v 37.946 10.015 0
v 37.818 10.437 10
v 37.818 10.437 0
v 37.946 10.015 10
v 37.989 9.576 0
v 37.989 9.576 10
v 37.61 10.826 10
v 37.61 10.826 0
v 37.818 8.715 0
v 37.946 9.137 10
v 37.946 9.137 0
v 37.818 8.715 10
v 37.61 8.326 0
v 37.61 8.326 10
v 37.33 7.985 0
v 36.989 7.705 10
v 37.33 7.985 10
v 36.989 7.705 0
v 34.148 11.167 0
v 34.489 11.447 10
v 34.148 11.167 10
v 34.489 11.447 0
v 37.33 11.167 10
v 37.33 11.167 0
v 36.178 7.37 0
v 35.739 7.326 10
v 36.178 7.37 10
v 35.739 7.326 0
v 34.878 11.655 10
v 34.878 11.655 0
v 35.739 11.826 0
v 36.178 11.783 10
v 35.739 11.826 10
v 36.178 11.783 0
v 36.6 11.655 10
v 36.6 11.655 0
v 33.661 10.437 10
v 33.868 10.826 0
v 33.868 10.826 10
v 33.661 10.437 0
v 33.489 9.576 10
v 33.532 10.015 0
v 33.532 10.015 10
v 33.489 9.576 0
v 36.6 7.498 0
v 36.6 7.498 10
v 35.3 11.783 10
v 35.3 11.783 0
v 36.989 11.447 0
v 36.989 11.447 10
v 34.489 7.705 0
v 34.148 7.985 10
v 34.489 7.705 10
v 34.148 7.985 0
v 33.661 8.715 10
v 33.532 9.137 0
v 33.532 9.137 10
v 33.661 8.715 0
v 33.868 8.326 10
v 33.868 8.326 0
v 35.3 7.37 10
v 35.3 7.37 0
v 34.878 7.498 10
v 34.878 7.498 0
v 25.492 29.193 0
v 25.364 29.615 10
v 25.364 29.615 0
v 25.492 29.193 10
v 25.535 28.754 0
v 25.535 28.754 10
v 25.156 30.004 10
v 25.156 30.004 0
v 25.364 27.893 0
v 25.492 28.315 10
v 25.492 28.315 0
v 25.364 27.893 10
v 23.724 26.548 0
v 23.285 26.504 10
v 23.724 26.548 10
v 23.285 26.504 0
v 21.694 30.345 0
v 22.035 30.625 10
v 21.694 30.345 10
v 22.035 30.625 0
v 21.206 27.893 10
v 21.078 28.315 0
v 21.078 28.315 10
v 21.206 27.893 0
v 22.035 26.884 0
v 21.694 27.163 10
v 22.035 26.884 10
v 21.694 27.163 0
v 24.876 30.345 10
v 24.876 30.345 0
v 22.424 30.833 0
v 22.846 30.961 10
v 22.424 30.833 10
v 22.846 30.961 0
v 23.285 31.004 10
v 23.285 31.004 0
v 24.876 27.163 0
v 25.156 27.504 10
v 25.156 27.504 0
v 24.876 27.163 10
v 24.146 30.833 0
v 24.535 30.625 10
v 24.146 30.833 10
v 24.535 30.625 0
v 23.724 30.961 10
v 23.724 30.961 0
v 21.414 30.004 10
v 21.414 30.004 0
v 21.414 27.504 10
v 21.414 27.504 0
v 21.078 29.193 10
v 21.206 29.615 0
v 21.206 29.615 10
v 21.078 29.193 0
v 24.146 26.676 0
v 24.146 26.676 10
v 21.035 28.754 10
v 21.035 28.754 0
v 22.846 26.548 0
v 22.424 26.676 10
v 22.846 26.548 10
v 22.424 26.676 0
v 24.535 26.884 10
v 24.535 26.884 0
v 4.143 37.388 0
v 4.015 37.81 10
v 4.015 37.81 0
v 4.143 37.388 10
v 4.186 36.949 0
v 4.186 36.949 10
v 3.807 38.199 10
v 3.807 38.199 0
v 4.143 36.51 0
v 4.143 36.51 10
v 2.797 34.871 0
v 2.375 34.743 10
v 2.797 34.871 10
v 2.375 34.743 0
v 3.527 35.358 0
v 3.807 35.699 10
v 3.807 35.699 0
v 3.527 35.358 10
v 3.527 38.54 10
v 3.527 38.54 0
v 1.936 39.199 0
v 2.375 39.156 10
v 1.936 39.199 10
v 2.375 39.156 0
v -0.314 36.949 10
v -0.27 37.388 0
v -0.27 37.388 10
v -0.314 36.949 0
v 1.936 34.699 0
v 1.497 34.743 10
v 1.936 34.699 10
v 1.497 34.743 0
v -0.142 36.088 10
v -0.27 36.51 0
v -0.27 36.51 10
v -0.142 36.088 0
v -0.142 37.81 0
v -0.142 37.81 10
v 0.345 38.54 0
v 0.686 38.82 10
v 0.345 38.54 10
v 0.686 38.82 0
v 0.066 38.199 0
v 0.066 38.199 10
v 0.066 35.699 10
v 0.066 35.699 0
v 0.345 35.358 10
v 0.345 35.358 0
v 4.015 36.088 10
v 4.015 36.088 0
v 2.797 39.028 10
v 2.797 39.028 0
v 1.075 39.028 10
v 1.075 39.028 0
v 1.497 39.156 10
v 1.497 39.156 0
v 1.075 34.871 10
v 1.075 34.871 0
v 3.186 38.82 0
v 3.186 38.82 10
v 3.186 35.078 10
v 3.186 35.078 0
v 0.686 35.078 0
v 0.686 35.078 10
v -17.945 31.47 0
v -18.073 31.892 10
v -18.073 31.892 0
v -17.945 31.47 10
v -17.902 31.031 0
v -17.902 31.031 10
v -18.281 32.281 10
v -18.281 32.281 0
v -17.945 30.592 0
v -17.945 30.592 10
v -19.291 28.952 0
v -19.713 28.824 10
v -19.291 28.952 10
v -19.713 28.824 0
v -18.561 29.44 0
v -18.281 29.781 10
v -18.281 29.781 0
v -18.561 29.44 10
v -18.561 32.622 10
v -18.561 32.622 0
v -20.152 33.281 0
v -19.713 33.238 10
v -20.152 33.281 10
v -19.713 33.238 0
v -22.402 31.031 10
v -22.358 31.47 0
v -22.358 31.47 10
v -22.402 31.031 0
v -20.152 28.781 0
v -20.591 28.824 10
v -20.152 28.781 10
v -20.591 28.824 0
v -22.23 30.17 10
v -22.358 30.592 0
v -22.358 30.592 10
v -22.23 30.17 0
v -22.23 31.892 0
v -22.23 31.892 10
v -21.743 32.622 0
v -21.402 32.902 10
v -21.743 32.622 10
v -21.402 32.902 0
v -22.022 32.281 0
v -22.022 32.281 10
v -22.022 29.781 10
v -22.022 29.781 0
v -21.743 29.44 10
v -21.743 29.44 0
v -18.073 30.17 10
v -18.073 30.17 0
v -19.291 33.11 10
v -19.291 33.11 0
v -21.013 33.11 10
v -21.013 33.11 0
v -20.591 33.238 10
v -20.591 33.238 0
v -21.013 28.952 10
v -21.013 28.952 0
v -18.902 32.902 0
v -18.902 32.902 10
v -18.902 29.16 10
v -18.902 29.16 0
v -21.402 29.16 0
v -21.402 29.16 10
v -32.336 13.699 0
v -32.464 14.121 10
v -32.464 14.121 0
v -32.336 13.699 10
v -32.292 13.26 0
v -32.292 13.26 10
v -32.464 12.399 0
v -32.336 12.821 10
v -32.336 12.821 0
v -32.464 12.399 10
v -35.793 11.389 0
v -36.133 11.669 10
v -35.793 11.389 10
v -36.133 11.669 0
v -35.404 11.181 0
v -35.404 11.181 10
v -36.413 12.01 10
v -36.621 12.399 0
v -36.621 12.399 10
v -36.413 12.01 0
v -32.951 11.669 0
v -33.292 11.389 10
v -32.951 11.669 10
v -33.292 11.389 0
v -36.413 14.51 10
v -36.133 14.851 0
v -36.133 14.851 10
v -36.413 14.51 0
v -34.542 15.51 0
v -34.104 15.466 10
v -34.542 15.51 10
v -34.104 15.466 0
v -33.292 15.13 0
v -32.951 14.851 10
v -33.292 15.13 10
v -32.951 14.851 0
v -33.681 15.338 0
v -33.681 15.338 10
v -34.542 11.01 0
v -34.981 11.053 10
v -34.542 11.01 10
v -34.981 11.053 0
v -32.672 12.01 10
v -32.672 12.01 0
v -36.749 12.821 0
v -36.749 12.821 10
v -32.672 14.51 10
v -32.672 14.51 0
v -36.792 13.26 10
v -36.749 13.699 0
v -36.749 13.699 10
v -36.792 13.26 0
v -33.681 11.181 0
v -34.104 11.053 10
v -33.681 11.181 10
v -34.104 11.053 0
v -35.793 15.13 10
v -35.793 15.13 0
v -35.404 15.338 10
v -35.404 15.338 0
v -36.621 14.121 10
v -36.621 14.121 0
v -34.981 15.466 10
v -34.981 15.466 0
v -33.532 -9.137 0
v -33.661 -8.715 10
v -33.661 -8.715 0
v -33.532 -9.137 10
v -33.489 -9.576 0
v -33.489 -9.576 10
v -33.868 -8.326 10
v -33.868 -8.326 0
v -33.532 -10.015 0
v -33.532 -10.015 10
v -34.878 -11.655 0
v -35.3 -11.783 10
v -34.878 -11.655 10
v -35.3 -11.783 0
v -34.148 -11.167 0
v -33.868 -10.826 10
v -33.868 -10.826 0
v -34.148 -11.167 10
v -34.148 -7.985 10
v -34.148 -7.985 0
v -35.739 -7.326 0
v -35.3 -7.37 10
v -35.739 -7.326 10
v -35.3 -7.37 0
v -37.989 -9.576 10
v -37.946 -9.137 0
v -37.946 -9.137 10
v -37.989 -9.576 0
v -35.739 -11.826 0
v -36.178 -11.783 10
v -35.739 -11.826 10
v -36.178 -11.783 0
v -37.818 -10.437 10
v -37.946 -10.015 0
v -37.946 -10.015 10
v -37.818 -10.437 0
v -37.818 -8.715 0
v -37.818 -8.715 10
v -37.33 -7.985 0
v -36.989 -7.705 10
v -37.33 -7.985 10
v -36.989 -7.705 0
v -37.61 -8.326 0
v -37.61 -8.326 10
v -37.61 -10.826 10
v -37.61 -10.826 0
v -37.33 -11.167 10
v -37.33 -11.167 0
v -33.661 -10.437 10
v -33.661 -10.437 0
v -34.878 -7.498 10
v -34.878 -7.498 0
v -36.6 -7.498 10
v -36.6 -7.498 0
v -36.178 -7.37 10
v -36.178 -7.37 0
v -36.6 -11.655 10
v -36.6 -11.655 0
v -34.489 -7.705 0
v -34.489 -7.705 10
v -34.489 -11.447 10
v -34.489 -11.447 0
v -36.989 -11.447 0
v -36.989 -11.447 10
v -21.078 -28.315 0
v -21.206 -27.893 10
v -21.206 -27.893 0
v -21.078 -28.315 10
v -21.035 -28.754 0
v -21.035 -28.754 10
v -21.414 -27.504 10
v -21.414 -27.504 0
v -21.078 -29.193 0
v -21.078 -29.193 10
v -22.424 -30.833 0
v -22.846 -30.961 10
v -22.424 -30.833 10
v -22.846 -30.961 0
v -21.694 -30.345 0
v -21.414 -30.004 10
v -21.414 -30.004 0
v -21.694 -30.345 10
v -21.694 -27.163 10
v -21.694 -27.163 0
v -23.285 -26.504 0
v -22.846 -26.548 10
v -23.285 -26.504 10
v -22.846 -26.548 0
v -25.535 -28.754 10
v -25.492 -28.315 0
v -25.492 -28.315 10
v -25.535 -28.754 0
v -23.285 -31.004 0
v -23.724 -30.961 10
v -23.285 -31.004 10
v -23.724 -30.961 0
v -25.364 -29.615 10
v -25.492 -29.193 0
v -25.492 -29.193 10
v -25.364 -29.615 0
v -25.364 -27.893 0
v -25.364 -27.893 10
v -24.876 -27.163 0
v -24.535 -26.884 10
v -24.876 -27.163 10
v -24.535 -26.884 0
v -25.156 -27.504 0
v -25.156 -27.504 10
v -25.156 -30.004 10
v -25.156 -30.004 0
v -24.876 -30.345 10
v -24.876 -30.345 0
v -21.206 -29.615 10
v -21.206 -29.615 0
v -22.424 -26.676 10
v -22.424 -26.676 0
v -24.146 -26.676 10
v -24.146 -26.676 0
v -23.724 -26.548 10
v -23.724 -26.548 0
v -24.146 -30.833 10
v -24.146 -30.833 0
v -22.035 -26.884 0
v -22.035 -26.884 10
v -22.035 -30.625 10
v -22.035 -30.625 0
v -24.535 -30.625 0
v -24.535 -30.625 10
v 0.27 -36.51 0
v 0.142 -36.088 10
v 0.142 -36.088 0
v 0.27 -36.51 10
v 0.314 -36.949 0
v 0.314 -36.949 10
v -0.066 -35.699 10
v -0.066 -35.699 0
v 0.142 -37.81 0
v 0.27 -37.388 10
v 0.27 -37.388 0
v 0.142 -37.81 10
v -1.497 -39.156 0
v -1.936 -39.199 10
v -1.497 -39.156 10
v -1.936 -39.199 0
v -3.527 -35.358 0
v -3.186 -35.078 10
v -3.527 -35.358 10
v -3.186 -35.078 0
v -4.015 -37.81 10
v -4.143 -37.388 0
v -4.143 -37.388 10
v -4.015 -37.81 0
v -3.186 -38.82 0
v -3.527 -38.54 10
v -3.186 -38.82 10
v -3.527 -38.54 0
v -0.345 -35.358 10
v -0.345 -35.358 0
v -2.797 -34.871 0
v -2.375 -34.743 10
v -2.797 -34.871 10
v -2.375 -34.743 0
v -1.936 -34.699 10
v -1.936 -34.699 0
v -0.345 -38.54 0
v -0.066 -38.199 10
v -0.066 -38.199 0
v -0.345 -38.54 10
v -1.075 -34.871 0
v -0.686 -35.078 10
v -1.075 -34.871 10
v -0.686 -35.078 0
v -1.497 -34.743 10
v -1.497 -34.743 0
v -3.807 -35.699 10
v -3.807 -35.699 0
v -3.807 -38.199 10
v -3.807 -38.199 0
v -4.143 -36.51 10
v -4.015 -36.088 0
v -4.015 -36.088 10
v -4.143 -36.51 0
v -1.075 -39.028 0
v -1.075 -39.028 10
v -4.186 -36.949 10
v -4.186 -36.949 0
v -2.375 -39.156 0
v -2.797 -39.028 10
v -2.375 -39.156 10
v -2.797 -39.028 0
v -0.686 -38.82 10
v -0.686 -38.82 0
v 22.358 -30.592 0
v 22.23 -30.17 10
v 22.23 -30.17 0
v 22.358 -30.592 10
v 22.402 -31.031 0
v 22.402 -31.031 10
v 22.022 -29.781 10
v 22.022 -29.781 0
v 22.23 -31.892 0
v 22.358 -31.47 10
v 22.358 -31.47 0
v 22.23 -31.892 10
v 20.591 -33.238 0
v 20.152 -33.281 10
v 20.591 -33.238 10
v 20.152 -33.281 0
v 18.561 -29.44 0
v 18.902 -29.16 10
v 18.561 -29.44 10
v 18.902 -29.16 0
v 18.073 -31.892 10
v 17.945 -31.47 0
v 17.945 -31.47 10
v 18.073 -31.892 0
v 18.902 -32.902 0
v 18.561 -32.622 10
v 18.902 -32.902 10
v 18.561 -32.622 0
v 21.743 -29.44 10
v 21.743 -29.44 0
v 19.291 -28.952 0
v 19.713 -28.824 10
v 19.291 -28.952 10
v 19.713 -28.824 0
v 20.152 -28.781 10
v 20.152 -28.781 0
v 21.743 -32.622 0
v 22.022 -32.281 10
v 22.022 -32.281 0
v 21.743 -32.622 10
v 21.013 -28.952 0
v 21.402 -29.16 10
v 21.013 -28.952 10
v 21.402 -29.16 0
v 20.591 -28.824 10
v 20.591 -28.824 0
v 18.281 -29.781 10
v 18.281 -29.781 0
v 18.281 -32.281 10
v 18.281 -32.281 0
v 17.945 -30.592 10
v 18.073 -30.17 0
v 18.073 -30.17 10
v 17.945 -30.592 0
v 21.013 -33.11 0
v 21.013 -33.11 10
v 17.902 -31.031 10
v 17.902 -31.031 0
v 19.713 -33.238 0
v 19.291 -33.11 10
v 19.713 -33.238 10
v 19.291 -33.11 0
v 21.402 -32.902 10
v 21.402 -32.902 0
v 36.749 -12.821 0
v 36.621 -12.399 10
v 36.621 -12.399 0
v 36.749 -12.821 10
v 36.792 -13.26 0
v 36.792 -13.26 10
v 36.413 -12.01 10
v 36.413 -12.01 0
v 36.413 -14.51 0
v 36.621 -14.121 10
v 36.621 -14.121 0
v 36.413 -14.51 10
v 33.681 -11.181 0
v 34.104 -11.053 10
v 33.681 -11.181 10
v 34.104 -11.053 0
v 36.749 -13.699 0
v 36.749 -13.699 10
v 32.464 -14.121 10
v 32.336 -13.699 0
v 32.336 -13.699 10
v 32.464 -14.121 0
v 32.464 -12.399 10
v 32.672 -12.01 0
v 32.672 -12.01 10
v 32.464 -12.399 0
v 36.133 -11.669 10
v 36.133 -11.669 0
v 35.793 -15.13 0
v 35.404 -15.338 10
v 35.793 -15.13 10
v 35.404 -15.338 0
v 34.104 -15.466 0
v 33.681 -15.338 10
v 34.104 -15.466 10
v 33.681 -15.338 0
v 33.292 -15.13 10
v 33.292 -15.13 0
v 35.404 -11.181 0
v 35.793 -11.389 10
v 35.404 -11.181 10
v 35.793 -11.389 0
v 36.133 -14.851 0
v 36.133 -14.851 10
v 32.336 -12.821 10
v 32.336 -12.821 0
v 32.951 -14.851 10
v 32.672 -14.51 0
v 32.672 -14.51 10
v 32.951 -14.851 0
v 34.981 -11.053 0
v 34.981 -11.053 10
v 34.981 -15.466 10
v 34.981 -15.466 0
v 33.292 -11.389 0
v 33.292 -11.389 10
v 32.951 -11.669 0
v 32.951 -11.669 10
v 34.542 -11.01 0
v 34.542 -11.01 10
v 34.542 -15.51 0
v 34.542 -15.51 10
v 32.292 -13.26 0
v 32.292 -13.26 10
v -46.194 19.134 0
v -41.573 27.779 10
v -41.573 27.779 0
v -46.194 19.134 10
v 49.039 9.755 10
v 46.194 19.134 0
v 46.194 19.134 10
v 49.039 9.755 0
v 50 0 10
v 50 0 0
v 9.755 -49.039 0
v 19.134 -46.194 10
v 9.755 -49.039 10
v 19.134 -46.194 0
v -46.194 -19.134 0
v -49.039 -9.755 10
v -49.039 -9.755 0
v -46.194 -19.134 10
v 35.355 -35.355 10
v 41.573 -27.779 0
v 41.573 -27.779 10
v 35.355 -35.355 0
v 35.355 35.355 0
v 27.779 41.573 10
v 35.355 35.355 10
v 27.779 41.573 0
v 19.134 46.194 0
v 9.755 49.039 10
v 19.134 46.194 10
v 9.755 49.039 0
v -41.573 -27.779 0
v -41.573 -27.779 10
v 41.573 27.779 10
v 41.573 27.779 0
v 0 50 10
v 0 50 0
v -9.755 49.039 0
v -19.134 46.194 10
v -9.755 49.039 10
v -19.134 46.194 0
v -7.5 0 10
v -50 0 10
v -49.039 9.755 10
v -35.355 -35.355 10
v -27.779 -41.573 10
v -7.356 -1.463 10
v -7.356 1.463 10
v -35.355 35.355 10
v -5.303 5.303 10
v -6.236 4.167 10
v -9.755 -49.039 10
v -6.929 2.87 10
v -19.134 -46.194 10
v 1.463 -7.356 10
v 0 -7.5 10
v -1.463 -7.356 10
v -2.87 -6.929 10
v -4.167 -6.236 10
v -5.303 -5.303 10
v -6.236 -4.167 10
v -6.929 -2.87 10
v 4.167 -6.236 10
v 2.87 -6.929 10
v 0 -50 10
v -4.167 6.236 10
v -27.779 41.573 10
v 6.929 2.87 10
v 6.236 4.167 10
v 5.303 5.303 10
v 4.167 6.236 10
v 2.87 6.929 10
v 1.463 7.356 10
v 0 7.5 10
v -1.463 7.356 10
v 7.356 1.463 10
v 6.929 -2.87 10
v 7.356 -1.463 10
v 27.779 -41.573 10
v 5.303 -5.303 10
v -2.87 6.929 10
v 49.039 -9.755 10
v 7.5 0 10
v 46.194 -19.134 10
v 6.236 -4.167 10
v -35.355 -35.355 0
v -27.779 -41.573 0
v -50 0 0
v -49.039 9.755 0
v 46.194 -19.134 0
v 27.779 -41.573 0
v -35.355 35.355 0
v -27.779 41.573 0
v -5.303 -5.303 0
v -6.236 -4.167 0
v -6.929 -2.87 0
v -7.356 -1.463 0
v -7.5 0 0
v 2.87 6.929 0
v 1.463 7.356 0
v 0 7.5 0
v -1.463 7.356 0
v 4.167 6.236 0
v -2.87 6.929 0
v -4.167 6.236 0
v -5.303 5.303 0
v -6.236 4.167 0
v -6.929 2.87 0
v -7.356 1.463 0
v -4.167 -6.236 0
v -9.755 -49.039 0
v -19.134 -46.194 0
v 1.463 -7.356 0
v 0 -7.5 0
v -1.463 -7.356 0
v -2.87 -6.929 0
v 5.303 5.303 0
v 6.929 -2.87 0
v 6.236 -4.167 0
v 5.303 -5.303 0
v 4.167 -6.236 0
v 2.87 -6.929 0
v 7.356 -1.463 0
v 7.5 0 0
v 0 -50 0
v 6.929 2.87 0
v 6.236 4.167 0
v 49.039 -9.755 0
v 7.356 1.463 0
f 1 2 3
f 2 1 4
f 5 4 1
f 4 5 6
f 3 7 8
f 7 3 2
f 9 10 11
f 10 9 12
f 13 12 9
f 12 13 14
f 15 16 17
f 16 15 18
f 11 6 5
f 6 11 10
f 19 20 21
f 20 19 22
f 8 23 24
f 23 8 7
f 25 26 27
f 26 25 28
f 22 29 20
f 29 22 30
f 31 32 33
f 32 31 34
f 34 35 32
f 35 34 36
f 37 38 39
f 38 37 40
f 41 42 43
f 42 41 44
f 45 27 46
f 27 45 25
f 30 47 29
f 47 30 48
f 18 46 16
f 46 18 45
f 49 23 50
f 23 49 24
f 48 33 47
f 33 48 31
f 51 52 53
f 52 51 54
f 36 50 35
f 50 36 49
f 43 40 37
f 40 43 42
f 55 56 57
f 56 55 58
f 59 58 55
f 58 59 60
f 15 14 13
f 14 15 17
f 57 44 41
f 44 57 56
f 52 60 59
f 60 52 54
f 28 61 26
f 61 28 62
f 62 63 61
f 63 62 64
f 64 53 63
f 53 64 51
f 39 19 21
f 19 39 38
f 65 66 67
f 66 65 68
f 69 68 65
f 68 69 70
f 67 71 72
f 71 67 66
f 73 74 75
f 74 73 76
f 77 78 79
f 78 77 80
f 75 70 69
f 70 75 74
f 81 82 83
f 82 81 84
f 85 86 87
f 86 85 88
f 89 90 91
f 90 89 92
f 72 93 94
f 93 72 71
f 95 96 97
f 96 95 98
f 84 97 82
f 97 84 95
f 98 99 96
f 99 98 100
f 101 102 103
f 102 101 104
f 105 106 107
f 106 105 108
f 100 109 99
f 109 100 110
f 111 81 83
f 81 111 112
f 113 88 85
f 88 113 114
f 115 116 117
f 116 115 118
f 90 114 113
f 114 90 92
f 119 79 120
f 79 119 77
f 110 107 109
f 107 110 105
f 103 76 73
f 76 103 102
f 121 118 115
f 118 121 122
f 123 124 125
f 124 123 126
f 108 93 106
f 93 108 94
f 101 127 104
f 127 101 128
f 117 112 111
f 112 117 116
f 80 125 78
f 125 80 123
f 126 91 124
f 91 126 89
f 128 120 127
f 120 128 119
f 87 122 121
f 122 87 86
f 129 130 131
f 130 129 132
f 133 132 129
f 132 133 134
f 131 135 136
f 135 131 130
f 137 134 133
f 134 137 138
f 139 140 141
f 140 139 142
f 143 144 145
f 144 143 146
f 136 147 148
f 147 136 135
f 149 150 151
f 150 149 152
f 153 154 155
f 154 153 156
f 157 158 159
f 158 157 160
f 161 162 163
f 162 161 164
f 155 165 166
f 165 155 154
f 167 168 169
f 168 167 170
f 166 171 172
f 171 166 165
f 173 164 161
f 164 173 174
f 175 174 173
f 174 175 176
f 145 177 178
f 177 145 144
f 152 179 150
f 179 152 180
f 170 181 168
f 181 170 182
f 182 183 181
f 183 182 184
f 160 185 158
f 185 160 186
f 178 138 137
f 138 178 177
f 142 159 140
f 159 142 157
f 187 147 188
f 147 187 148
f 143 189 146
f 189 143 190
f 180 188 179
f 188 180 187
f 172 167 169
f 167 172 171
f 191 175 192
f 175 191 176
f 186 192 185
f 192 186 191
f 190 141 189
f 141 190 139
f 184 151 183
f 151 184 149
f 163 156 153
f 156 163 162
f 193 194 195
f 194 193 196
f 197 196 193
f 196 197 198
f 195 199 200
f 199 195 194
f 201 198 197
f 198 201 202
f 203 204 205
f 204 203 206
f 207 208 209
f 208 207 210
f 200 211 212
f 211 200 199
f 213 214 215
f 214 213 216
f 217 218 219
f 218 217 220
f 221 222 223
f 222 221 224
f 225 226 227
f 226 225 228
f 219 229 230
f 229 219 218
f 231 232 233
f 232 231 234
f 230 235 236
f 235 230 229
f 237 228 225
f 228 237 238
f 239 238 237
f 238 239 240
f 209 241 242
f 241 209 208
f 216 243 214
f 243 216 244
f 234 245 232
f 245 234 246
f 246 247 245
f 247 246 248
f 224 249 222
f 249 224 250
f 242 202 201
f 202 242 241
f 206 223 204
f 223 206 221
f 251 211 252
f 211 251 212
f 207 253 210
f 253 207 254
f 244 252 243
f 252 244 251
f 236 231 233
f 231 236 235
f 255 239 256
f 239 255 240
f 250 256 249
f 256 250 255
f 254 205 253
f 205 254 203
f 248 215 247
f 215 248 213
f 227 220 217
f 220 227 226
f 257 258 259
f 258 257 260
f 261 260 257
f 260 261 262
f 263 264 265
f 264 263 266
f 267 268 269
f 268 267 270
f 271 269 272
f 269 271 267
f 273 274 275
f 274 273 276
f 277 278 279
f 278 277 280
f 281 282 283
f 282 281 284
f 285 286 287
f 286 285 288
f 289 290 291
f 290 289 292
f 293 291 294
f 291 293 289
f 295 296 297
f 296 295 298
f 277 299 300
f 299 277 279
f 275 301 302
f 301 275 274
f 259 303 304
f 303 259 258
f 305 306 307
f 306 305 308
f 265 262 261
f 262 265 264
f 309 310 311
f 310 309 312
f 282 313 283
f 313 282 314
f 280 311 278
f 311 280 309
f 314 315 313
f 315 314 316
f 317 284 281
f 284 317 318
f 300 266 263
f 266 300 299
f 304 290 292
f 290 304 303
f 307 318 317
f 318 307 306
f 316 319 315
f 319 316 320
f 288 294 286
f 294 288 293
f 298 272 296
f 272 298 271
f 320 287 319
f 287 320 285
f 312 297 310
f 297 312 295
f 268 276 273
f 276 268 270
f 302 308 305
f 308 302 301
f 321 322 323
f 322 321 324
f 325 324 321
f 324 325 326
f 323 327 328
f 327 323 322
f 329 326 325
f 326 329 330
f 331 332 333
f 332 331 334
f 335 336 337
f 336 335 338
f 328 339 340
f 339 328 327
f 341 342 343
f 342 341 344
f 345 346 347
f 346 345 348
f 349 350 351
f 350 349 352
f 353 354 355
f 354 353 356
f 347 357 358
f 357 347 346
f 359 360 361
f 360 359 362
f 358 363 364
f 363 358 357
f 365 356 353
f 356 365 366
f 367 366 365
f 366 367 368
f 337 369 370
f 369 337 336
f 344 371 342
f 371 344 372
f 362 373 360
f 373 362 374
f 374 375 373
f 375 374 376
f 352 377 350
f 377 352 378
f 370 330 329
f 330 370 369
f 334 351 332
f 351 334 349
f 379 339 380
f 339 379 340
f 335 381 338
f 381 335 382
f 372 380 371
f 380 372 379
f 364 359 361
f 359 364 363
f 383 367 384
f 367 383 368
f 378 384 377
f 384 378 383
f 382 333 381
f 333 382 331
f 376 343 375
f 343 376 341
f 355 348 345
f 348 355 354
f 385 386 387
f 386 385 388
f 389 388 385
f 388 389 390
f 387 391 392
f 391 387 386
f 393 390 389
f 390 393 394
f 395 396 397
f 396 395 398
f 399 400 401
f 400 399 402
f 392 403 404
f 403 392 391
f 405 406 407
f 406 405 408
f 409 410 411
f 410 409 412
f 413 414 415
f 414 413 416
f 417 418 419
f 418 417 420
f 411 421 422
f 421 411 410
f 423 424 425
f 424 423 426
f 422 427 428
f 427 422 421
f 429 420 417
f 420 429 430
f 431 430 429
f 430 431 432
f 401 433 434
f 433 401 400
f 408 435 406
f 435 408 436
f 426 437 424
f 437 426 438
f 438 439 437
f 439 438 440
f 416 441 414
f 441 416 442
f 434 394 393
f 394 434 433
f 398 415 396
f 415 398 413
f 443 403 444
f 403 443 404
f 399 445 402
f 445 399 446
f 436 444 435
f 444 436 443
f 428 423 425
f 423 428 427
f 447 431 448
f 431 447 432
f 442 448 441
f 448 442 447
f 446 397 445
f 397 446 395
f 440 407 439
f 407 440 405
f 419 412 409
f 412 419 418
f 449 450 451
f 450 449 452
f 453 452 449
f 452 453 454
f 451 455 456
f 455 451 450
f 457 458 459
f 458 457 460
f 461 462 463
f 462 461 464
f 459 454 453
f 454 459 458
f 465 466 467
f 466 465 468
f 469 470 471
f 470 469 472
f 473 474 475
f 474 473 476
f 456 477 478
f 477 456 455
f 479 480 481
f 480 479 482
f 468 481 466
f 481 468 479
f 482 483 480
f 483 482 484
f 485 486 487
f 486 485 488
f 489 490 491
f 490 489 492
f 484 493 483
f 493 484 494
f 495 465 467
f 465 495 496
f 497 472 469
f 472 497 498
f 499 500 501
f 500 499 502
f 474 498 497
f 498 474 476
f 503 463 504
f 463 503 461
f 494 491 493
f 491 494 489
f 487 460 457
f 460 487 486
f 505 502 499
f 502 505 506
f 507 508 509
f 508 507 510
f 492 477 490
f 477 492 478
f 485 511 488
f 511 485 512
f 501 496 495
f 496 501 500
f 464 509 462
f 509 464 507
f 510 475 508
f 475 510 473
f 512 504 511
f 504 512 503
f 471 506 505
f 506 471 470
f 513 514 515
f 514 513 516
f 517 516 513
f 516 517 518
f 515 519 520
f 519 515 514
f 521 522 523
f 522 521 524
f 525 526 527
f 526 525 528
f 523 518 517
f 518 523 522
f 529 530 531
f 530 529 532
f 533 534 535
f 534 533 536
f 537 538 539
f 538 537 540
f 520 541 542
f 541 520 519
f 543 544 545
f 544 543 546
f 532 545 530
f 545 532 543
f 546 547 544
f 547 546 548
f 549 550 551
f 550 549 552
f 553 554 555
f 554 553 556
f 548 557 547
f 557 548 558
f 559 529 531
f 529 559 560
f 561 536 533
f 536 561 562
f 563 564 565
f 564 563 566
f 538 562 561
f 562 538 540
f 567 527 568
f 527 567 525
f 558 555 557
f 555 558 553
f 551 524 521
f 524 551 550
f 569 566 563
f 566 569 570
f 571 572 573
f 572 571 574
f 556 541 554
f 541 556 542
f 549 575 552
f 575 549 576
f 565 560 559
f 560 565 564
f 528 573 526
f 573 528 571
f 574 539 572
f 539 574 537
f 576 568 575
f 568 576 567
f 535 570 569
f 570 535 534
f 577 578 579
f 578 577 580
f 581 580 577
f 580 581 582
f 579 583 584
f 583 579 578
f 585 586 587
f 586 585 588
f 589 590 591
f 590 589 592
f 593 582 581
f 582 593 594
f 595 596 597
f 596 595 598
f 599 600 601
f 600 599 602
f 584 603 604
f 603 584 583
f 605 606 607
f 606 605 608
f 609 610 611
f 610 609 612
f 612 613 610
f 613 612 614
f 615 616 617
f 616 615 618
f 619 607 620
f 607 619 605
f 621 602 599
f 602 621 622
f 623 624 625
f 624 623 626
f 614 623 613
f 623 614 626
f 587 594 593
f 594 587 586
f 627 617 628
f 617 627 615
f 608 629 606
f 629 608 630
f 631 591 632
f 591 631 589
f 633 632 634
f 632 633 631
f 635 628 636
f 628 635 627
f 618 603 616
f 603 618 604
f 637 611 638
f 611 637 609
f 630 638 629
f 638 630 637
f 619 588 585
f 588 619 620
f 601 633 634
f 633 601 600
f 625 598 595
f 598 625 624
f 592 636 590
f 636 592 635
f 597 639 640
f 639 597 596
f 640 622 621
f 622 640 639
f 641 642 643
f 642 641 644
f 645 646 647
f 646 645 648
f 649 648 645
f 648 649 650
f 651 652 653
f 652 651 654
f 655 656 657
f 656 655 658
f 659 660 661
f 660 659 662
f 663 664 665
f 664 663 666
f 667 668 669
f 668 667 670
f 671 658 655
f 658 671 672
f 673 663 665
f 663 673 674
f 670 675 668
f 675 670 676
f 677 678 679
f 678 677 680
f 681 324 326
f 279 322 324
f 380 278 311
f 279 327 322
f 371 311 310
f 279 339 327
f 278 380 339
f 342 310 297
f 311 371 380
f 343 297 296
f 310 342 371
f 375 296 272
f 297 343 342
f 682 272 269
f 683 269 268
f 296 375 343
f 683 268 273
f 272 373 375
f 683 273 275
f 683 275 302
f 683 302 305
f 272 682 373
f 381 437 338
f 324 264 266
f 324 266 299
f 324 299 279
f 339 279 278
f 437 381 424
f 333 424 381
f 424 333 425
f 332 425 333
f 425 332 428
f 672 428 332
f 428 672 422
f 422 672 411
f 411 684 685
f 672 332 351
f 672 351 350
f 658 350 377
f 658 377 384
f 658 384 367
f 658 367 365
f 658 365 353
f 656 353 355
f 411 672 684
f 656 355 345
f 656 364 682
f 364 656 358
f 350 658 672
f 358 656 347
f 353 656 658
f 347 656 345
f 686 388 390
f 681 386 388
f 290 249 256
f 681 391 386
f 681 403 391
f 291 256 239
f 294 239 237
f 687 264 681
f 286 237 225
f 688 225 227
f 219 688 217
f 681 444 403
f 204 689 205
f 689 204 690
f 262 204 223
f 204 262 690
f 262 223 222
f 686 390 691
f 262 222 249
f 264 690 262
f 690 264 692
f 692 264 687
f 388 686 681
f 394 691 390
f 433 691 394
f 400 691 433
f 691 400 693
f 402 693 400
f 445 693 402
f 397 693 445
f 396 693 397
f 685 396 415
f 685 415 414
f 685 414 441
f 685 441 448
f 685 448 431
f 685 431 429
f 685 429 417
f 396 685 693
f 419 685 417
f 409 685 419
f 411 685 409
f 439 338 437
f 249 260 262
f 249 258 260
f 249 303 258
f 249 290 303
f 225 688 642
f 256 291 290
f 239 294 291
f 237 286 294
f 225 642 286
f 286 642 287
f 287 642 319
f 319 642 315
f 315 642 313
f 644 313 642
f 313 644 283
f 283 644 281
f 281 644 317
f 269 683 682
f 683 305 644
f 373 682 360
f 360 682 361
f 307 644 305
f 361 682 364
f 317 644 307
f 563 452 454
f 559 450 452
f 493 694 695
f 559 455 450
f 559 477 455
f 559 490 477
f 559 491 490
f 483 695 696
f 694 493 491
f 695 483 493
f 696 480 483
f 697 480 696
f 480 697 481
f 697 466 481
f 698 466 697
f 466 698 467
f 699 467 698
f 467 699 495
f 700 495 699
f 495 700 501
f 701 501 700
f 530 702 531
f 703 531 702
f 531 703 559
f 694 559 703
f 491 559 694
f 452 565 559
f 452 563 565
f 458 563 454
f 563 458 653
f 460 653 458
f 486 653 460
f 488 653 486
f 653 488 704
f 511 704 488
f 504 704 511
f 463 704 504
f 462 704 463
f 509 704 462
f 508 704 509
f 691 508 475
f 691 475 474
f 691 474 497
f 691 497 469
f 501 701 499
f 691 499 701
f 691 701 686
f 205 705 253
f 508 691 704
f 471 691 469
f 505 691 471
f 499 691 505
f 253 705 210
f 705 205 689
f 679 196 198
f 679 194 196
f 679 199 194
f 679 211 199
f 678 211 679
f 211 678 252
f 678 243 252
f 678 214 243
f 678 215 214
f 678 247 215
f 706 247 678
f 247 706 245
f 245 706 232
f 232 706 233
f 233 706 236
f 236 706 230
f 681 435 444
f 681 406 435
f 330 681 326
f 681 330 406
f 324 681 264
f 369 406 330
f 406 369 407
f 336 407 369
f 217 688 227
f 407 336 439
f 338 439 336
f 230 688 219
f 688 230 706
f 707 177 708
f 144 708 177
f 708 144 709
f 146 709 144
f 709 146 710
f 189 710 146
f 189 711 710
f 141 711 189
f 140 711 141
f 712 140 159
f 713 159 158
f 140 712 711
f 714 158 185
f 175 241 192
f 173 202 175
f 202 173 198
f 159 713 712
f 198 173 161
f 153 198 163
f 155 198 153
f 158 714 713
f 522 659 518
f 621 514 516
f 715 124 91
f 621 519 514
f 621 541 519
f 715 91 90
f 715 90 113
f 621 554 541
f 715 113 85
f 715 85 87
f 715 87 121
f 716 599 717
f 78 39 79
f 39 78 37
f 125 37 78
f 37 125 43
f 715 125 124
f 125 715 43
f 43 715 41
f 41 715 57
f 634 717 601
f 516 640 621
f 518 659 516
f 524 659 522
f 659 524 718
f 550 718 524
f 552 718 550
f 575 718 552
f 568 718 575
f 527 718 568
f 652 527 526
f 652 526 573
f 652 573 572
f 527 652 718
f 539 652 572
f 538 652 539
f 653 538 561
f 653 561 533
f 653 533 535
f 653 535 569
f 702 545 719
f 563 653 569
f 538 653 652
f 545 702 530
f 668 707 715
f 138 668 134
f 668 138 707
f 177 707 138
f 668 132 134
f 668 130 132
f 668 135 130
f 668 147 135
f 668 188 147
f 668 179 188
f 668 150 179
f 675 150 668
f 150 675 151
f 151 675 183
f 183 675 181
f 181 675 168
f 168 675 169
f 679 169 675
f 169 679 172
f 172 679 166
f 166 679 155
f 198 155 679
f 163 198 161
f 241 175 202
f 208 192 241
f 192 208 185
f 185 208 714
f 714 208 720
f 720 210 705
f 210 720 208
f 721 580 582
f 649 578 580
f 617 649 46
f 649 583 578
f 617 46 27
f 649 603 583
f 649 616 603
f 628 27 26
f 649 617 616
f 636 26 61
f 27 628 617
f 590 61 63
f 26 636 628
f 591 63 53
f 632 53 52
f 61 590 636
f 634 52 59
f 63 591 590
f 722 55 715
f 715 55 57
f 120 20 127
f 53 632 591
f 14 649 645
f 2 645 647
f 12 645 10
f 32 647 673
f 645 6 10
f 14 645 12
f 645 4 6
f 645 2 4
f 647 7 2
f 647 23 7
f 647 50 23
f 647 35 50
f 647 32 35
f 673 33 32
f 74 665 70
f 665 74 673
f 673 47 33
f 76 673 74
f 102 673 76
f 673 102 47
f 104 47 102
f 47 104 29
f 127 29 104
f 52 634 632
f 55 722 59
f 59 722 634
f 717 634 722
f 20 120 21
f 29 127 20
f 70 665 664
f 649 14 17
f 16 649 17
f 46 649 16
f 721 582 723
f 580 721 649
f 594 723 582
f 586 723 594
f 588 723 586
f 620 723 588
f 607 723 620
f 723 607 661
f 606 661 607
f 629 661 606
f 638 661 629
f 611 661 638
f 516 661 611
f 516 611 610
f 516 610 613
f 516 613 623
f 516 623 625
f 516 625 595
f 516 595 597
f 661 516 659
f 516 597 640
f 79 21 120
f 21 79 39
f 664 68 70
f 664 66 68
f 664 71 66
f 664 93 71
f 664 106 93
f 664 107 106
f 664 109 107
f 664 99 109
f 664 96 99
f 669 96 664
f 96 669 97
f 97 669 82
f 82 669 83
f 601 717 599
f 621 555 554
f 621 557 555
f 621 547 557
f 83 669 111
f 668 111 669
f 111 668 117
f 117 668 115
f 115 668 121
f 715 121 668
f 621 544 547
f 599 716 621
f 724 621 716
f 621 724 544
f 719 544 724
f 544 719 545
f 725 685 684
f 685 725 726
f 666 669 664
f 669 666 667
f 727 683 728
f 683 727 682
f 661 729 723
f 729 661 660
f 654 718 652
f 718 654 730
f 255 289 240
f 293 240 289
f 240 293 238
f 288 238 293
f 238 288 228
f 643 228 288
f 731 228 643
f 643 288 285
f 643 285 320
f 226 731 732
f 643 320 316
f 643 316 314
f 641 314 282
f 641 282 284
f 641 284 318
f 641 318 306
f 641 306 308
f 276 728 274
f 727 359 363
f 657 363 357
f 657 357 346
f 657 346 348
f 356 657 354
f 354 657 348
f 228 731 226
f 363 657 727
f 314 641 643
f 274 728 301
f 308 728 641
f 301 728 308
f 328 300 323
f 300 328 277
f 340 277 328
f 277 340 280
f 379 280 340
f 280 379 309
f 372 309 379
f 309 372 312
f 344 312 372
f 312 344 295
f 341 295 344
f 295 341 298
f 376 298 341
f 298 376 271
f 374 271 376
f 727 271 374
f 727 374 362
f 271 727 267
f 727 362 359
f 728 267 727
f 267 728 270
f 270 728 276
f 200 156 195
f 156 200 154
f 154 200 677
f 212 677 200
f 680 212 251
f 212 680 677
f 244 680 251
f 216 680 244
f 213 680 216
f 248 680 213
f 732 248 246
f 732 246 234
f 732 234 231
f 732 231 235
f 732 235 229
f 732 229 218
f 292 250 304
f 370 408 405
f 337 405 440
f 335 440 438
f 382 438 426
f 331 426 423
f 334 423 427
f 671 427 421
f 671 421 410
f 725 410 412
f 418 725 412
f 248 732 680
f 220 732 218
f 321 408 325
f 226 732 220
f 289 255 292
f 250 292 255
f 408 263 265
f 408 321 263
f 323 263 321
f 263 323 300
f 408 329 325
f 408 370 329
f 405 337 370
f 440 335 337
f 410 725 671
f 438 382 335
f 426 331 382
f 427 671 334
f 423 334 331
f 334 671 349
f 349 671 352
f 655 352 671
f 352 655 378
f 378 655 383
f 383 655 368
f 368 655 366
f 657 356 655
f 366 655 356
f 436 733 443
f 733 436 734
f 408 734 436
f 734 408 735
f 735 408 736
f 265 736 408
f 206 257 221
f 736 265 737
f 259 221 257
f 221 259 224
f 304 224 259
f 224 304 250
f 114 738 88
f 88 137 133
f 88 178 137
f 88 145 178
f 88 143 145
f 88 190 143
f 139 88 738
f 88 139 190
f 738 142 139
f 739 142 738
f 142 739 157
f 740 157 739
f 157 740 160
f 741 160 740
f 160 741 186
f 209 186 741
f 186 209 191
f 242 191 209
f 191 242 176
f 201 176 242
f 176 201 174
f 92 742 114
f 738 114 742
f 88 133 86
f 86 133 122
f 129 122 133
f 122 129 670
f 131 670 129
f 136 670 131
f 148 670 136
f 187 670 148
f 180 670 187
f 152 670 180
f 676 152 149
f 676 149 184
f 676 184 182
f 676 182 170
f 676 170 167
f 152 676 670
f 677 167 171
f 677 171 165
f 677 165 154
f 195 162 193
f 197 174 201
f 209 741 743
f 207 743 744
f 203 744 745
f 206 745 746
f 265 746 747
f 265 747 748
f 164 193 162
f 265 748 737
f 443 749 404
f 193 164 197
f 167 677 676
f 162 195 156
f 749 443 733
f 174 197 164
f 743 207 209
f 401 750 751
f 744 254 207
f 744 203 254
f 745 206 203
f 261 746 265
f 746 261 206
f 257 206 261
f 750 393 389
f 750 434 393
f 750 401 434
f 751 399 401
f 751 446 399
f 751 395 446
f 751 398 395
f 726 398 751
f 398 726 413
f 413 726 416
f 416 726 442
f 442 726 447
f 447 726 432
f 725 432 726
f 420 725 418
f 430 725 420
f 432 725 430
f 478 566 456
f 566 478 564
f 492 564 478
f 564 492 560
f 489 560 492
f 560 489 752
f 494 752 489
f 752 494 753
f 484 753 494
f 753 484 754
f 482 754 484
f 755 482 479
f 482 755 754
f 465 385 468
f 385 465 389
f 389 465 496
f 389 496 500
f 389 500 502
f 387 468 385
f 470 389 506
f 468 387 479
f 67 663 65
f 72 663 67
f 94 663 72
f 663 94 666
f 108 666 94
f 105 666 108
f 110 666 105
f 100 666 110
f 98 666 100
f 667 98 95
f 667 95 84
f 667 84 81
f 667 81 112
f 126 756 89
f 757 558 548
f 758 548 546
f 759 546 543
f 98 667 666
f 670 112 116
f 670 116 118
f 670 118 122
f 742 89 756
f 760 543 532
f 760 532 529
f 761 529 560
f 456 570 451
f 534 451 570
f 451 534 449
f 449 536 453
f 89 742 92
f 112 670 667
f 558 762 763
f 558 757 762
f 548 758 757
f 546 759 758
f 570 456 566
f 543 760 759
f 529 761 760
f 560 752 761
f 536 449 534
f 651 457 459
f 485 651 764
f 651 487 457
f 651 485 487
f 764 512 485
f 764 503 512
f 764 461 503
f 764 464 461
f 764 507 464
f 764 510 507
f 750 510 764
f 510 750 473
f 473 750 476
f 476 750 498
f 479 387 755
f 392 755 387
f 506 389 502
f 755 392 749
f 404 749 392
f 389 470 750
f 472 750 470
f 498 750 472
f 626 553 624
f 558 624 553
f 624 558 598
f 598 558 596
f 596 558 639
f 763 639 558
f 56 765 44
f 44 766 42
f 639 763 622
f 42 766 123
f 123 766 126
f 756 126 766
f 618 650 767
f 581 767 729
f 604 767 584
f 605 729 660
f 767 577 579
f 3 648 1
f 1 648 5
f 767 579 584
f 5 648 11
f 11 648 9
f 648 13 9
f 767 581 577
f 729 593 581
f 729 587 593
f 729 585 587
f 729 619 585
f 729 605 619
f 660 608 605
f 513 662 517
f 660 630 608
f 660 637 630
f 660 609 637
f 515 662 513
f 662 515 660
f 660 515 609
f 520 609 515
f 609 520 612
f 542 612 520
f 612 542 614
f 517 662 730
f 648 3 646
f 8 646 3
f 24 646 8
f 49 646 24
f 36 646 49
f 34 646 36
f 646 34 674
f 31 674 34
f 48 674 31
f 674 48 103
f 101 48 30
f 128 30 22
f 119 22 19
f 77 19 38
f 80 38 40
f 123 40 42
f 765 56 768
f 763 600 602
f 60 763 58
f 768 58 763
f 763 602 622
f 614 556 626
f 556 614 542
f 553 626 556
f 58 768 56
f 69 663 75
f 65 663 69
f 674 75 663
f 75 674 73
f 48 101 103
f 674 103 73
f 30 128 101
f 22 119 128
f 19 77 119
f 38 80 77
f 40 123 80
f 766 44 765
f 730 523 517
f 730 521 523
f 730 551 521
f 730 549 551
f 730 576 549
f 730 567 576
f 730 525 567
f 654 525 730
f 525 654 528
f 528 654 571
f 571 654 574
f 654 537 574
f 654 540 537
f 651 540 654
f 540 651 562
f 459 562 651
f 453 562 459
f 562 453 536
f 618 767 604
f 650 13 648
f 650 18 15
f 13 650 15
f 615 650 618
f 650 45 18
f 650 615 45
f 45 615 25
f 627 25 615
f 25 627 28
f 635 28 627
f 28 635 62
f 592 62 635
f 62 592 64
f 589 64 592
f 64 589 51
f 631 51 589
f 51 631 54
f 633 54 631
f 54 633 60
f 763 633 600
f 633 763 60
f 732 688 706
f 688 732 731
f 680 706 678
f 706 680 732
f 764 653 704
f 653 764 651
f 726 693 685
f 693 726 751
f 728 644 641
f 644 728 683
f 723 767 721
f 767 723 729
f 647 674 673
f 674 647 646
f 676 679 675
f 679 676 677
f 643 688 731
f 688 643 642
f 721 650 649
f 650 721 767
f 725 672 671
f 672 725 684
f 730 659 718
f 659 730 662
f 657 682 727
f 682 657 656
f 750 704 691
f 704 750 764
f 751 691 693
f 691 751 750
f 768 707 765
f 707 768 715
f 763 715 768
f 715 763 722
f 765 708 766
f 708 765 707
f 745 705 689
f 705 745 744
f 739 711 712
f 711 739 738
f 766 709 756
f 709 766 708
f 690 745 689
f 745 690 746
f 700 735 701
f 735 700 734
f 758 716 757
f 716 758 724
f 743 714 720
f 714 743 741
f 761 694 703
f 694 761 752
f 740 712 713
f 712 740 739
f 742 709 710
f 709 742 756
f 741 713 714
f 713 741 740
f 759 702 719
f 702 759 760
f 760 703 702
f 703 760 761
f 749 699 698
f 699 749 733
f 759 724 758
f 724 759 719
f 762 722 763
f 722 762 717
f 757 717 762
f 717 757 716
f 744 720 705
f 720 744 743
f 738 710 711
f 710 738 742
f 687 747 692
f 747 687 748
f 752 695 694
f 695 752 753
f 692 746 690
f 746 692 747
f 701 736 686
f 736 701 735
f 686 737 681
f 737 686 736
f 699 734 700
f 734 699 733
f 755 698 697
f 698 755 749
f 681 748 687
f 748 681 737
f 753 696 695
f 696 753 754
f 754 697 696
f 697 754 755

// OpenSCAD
$fn = 32;

// ----------------------------------------------------------------------
// Flange Ø100 x 10
// 10 holes on a Ø74 bolt circle, bolted joints
// ----------------------------------------------------------------------

// --- parameters (mm) ---
flange_d = 100;  // outside diameter of the flange
thickness = 10;  // flange thickness
holes = 10;      // number of bolt holes
pcd = 74;        // bolt circle diameter
start_deg = 15;  // angle of the first hole, from +X
hole_d = 4.5;    // bolt hole diameter
bore_d = 15;     // central through bore
hub_d = 23;      // hub outside diameter
hub_h = 0;       // hub height above the flange face (0 = no hub)

// --- derived feature positions (mm) ---
height = thickness + hub_h;  // = 10   overall height of the part
pcd_r = pcd / 2;             // = 37   bolt circle radius
hole_step = 360 / holes;     // = 36   angular pitch
feature_centers = [
  [pcd_r * cos(start_deg + 0 * hole_step), pcd_r * sin(start_deg + 0 * hole_step)],
  [pcd_r * cos(start_deg + 1 * hole_step), pcd_r * sin(start_deg + 1 * hole_step)],
  [pcd_r * cos(start_deg + 2 * hole_step), pcd_r * sin(start_deg + 2 * hole_step)],
  [pcd_r * cos(start_deg + 3 * hole_step), pcd_r * sin(start_deg + 3 * hole_step)],
  [pcd_r * cos(start_deg + 4 * hole_step), pcd_r * sin(start_deg + 4 * hole_step)],
  [pcd_r * cos(start_deg + 5 * hole_step), pcd_r * sin(start_deg + 5 * hole_step)],
  [pcd_r * cos(start_deg + 6 * hole_step), pcd_r * sin(start_deg + 6 * hole_step)],
  [pcd_r * cos(start_deg + 7 * hole_step), pcd_r * sin(start_deg + 7 * hole_step)],
  [pcd_r * cos(start_deg + 8 * hole_step), pcd_r * sin(start_deg + 8 * hole_step)],
  [pcd_r * cos(start_deg + 9 * hole_step), pcd_r * sin(start_deg + 9 * hole_step)]
];   // bolt hole centres on the pitch circle

// flange disc, every hole and the bore cut straight through
difference() {
  union() {
    cylinder(d = flange_d, h = thickness);
  }
  translate([0, 0, -1]) cylinder(d = bore_d, h = height + 2);  // bore, through
  for (centre = feature_centers)
    translate([centre[0], centre[1], -1]) cylinder(d = hole_d, h = thickness + 2);
}
